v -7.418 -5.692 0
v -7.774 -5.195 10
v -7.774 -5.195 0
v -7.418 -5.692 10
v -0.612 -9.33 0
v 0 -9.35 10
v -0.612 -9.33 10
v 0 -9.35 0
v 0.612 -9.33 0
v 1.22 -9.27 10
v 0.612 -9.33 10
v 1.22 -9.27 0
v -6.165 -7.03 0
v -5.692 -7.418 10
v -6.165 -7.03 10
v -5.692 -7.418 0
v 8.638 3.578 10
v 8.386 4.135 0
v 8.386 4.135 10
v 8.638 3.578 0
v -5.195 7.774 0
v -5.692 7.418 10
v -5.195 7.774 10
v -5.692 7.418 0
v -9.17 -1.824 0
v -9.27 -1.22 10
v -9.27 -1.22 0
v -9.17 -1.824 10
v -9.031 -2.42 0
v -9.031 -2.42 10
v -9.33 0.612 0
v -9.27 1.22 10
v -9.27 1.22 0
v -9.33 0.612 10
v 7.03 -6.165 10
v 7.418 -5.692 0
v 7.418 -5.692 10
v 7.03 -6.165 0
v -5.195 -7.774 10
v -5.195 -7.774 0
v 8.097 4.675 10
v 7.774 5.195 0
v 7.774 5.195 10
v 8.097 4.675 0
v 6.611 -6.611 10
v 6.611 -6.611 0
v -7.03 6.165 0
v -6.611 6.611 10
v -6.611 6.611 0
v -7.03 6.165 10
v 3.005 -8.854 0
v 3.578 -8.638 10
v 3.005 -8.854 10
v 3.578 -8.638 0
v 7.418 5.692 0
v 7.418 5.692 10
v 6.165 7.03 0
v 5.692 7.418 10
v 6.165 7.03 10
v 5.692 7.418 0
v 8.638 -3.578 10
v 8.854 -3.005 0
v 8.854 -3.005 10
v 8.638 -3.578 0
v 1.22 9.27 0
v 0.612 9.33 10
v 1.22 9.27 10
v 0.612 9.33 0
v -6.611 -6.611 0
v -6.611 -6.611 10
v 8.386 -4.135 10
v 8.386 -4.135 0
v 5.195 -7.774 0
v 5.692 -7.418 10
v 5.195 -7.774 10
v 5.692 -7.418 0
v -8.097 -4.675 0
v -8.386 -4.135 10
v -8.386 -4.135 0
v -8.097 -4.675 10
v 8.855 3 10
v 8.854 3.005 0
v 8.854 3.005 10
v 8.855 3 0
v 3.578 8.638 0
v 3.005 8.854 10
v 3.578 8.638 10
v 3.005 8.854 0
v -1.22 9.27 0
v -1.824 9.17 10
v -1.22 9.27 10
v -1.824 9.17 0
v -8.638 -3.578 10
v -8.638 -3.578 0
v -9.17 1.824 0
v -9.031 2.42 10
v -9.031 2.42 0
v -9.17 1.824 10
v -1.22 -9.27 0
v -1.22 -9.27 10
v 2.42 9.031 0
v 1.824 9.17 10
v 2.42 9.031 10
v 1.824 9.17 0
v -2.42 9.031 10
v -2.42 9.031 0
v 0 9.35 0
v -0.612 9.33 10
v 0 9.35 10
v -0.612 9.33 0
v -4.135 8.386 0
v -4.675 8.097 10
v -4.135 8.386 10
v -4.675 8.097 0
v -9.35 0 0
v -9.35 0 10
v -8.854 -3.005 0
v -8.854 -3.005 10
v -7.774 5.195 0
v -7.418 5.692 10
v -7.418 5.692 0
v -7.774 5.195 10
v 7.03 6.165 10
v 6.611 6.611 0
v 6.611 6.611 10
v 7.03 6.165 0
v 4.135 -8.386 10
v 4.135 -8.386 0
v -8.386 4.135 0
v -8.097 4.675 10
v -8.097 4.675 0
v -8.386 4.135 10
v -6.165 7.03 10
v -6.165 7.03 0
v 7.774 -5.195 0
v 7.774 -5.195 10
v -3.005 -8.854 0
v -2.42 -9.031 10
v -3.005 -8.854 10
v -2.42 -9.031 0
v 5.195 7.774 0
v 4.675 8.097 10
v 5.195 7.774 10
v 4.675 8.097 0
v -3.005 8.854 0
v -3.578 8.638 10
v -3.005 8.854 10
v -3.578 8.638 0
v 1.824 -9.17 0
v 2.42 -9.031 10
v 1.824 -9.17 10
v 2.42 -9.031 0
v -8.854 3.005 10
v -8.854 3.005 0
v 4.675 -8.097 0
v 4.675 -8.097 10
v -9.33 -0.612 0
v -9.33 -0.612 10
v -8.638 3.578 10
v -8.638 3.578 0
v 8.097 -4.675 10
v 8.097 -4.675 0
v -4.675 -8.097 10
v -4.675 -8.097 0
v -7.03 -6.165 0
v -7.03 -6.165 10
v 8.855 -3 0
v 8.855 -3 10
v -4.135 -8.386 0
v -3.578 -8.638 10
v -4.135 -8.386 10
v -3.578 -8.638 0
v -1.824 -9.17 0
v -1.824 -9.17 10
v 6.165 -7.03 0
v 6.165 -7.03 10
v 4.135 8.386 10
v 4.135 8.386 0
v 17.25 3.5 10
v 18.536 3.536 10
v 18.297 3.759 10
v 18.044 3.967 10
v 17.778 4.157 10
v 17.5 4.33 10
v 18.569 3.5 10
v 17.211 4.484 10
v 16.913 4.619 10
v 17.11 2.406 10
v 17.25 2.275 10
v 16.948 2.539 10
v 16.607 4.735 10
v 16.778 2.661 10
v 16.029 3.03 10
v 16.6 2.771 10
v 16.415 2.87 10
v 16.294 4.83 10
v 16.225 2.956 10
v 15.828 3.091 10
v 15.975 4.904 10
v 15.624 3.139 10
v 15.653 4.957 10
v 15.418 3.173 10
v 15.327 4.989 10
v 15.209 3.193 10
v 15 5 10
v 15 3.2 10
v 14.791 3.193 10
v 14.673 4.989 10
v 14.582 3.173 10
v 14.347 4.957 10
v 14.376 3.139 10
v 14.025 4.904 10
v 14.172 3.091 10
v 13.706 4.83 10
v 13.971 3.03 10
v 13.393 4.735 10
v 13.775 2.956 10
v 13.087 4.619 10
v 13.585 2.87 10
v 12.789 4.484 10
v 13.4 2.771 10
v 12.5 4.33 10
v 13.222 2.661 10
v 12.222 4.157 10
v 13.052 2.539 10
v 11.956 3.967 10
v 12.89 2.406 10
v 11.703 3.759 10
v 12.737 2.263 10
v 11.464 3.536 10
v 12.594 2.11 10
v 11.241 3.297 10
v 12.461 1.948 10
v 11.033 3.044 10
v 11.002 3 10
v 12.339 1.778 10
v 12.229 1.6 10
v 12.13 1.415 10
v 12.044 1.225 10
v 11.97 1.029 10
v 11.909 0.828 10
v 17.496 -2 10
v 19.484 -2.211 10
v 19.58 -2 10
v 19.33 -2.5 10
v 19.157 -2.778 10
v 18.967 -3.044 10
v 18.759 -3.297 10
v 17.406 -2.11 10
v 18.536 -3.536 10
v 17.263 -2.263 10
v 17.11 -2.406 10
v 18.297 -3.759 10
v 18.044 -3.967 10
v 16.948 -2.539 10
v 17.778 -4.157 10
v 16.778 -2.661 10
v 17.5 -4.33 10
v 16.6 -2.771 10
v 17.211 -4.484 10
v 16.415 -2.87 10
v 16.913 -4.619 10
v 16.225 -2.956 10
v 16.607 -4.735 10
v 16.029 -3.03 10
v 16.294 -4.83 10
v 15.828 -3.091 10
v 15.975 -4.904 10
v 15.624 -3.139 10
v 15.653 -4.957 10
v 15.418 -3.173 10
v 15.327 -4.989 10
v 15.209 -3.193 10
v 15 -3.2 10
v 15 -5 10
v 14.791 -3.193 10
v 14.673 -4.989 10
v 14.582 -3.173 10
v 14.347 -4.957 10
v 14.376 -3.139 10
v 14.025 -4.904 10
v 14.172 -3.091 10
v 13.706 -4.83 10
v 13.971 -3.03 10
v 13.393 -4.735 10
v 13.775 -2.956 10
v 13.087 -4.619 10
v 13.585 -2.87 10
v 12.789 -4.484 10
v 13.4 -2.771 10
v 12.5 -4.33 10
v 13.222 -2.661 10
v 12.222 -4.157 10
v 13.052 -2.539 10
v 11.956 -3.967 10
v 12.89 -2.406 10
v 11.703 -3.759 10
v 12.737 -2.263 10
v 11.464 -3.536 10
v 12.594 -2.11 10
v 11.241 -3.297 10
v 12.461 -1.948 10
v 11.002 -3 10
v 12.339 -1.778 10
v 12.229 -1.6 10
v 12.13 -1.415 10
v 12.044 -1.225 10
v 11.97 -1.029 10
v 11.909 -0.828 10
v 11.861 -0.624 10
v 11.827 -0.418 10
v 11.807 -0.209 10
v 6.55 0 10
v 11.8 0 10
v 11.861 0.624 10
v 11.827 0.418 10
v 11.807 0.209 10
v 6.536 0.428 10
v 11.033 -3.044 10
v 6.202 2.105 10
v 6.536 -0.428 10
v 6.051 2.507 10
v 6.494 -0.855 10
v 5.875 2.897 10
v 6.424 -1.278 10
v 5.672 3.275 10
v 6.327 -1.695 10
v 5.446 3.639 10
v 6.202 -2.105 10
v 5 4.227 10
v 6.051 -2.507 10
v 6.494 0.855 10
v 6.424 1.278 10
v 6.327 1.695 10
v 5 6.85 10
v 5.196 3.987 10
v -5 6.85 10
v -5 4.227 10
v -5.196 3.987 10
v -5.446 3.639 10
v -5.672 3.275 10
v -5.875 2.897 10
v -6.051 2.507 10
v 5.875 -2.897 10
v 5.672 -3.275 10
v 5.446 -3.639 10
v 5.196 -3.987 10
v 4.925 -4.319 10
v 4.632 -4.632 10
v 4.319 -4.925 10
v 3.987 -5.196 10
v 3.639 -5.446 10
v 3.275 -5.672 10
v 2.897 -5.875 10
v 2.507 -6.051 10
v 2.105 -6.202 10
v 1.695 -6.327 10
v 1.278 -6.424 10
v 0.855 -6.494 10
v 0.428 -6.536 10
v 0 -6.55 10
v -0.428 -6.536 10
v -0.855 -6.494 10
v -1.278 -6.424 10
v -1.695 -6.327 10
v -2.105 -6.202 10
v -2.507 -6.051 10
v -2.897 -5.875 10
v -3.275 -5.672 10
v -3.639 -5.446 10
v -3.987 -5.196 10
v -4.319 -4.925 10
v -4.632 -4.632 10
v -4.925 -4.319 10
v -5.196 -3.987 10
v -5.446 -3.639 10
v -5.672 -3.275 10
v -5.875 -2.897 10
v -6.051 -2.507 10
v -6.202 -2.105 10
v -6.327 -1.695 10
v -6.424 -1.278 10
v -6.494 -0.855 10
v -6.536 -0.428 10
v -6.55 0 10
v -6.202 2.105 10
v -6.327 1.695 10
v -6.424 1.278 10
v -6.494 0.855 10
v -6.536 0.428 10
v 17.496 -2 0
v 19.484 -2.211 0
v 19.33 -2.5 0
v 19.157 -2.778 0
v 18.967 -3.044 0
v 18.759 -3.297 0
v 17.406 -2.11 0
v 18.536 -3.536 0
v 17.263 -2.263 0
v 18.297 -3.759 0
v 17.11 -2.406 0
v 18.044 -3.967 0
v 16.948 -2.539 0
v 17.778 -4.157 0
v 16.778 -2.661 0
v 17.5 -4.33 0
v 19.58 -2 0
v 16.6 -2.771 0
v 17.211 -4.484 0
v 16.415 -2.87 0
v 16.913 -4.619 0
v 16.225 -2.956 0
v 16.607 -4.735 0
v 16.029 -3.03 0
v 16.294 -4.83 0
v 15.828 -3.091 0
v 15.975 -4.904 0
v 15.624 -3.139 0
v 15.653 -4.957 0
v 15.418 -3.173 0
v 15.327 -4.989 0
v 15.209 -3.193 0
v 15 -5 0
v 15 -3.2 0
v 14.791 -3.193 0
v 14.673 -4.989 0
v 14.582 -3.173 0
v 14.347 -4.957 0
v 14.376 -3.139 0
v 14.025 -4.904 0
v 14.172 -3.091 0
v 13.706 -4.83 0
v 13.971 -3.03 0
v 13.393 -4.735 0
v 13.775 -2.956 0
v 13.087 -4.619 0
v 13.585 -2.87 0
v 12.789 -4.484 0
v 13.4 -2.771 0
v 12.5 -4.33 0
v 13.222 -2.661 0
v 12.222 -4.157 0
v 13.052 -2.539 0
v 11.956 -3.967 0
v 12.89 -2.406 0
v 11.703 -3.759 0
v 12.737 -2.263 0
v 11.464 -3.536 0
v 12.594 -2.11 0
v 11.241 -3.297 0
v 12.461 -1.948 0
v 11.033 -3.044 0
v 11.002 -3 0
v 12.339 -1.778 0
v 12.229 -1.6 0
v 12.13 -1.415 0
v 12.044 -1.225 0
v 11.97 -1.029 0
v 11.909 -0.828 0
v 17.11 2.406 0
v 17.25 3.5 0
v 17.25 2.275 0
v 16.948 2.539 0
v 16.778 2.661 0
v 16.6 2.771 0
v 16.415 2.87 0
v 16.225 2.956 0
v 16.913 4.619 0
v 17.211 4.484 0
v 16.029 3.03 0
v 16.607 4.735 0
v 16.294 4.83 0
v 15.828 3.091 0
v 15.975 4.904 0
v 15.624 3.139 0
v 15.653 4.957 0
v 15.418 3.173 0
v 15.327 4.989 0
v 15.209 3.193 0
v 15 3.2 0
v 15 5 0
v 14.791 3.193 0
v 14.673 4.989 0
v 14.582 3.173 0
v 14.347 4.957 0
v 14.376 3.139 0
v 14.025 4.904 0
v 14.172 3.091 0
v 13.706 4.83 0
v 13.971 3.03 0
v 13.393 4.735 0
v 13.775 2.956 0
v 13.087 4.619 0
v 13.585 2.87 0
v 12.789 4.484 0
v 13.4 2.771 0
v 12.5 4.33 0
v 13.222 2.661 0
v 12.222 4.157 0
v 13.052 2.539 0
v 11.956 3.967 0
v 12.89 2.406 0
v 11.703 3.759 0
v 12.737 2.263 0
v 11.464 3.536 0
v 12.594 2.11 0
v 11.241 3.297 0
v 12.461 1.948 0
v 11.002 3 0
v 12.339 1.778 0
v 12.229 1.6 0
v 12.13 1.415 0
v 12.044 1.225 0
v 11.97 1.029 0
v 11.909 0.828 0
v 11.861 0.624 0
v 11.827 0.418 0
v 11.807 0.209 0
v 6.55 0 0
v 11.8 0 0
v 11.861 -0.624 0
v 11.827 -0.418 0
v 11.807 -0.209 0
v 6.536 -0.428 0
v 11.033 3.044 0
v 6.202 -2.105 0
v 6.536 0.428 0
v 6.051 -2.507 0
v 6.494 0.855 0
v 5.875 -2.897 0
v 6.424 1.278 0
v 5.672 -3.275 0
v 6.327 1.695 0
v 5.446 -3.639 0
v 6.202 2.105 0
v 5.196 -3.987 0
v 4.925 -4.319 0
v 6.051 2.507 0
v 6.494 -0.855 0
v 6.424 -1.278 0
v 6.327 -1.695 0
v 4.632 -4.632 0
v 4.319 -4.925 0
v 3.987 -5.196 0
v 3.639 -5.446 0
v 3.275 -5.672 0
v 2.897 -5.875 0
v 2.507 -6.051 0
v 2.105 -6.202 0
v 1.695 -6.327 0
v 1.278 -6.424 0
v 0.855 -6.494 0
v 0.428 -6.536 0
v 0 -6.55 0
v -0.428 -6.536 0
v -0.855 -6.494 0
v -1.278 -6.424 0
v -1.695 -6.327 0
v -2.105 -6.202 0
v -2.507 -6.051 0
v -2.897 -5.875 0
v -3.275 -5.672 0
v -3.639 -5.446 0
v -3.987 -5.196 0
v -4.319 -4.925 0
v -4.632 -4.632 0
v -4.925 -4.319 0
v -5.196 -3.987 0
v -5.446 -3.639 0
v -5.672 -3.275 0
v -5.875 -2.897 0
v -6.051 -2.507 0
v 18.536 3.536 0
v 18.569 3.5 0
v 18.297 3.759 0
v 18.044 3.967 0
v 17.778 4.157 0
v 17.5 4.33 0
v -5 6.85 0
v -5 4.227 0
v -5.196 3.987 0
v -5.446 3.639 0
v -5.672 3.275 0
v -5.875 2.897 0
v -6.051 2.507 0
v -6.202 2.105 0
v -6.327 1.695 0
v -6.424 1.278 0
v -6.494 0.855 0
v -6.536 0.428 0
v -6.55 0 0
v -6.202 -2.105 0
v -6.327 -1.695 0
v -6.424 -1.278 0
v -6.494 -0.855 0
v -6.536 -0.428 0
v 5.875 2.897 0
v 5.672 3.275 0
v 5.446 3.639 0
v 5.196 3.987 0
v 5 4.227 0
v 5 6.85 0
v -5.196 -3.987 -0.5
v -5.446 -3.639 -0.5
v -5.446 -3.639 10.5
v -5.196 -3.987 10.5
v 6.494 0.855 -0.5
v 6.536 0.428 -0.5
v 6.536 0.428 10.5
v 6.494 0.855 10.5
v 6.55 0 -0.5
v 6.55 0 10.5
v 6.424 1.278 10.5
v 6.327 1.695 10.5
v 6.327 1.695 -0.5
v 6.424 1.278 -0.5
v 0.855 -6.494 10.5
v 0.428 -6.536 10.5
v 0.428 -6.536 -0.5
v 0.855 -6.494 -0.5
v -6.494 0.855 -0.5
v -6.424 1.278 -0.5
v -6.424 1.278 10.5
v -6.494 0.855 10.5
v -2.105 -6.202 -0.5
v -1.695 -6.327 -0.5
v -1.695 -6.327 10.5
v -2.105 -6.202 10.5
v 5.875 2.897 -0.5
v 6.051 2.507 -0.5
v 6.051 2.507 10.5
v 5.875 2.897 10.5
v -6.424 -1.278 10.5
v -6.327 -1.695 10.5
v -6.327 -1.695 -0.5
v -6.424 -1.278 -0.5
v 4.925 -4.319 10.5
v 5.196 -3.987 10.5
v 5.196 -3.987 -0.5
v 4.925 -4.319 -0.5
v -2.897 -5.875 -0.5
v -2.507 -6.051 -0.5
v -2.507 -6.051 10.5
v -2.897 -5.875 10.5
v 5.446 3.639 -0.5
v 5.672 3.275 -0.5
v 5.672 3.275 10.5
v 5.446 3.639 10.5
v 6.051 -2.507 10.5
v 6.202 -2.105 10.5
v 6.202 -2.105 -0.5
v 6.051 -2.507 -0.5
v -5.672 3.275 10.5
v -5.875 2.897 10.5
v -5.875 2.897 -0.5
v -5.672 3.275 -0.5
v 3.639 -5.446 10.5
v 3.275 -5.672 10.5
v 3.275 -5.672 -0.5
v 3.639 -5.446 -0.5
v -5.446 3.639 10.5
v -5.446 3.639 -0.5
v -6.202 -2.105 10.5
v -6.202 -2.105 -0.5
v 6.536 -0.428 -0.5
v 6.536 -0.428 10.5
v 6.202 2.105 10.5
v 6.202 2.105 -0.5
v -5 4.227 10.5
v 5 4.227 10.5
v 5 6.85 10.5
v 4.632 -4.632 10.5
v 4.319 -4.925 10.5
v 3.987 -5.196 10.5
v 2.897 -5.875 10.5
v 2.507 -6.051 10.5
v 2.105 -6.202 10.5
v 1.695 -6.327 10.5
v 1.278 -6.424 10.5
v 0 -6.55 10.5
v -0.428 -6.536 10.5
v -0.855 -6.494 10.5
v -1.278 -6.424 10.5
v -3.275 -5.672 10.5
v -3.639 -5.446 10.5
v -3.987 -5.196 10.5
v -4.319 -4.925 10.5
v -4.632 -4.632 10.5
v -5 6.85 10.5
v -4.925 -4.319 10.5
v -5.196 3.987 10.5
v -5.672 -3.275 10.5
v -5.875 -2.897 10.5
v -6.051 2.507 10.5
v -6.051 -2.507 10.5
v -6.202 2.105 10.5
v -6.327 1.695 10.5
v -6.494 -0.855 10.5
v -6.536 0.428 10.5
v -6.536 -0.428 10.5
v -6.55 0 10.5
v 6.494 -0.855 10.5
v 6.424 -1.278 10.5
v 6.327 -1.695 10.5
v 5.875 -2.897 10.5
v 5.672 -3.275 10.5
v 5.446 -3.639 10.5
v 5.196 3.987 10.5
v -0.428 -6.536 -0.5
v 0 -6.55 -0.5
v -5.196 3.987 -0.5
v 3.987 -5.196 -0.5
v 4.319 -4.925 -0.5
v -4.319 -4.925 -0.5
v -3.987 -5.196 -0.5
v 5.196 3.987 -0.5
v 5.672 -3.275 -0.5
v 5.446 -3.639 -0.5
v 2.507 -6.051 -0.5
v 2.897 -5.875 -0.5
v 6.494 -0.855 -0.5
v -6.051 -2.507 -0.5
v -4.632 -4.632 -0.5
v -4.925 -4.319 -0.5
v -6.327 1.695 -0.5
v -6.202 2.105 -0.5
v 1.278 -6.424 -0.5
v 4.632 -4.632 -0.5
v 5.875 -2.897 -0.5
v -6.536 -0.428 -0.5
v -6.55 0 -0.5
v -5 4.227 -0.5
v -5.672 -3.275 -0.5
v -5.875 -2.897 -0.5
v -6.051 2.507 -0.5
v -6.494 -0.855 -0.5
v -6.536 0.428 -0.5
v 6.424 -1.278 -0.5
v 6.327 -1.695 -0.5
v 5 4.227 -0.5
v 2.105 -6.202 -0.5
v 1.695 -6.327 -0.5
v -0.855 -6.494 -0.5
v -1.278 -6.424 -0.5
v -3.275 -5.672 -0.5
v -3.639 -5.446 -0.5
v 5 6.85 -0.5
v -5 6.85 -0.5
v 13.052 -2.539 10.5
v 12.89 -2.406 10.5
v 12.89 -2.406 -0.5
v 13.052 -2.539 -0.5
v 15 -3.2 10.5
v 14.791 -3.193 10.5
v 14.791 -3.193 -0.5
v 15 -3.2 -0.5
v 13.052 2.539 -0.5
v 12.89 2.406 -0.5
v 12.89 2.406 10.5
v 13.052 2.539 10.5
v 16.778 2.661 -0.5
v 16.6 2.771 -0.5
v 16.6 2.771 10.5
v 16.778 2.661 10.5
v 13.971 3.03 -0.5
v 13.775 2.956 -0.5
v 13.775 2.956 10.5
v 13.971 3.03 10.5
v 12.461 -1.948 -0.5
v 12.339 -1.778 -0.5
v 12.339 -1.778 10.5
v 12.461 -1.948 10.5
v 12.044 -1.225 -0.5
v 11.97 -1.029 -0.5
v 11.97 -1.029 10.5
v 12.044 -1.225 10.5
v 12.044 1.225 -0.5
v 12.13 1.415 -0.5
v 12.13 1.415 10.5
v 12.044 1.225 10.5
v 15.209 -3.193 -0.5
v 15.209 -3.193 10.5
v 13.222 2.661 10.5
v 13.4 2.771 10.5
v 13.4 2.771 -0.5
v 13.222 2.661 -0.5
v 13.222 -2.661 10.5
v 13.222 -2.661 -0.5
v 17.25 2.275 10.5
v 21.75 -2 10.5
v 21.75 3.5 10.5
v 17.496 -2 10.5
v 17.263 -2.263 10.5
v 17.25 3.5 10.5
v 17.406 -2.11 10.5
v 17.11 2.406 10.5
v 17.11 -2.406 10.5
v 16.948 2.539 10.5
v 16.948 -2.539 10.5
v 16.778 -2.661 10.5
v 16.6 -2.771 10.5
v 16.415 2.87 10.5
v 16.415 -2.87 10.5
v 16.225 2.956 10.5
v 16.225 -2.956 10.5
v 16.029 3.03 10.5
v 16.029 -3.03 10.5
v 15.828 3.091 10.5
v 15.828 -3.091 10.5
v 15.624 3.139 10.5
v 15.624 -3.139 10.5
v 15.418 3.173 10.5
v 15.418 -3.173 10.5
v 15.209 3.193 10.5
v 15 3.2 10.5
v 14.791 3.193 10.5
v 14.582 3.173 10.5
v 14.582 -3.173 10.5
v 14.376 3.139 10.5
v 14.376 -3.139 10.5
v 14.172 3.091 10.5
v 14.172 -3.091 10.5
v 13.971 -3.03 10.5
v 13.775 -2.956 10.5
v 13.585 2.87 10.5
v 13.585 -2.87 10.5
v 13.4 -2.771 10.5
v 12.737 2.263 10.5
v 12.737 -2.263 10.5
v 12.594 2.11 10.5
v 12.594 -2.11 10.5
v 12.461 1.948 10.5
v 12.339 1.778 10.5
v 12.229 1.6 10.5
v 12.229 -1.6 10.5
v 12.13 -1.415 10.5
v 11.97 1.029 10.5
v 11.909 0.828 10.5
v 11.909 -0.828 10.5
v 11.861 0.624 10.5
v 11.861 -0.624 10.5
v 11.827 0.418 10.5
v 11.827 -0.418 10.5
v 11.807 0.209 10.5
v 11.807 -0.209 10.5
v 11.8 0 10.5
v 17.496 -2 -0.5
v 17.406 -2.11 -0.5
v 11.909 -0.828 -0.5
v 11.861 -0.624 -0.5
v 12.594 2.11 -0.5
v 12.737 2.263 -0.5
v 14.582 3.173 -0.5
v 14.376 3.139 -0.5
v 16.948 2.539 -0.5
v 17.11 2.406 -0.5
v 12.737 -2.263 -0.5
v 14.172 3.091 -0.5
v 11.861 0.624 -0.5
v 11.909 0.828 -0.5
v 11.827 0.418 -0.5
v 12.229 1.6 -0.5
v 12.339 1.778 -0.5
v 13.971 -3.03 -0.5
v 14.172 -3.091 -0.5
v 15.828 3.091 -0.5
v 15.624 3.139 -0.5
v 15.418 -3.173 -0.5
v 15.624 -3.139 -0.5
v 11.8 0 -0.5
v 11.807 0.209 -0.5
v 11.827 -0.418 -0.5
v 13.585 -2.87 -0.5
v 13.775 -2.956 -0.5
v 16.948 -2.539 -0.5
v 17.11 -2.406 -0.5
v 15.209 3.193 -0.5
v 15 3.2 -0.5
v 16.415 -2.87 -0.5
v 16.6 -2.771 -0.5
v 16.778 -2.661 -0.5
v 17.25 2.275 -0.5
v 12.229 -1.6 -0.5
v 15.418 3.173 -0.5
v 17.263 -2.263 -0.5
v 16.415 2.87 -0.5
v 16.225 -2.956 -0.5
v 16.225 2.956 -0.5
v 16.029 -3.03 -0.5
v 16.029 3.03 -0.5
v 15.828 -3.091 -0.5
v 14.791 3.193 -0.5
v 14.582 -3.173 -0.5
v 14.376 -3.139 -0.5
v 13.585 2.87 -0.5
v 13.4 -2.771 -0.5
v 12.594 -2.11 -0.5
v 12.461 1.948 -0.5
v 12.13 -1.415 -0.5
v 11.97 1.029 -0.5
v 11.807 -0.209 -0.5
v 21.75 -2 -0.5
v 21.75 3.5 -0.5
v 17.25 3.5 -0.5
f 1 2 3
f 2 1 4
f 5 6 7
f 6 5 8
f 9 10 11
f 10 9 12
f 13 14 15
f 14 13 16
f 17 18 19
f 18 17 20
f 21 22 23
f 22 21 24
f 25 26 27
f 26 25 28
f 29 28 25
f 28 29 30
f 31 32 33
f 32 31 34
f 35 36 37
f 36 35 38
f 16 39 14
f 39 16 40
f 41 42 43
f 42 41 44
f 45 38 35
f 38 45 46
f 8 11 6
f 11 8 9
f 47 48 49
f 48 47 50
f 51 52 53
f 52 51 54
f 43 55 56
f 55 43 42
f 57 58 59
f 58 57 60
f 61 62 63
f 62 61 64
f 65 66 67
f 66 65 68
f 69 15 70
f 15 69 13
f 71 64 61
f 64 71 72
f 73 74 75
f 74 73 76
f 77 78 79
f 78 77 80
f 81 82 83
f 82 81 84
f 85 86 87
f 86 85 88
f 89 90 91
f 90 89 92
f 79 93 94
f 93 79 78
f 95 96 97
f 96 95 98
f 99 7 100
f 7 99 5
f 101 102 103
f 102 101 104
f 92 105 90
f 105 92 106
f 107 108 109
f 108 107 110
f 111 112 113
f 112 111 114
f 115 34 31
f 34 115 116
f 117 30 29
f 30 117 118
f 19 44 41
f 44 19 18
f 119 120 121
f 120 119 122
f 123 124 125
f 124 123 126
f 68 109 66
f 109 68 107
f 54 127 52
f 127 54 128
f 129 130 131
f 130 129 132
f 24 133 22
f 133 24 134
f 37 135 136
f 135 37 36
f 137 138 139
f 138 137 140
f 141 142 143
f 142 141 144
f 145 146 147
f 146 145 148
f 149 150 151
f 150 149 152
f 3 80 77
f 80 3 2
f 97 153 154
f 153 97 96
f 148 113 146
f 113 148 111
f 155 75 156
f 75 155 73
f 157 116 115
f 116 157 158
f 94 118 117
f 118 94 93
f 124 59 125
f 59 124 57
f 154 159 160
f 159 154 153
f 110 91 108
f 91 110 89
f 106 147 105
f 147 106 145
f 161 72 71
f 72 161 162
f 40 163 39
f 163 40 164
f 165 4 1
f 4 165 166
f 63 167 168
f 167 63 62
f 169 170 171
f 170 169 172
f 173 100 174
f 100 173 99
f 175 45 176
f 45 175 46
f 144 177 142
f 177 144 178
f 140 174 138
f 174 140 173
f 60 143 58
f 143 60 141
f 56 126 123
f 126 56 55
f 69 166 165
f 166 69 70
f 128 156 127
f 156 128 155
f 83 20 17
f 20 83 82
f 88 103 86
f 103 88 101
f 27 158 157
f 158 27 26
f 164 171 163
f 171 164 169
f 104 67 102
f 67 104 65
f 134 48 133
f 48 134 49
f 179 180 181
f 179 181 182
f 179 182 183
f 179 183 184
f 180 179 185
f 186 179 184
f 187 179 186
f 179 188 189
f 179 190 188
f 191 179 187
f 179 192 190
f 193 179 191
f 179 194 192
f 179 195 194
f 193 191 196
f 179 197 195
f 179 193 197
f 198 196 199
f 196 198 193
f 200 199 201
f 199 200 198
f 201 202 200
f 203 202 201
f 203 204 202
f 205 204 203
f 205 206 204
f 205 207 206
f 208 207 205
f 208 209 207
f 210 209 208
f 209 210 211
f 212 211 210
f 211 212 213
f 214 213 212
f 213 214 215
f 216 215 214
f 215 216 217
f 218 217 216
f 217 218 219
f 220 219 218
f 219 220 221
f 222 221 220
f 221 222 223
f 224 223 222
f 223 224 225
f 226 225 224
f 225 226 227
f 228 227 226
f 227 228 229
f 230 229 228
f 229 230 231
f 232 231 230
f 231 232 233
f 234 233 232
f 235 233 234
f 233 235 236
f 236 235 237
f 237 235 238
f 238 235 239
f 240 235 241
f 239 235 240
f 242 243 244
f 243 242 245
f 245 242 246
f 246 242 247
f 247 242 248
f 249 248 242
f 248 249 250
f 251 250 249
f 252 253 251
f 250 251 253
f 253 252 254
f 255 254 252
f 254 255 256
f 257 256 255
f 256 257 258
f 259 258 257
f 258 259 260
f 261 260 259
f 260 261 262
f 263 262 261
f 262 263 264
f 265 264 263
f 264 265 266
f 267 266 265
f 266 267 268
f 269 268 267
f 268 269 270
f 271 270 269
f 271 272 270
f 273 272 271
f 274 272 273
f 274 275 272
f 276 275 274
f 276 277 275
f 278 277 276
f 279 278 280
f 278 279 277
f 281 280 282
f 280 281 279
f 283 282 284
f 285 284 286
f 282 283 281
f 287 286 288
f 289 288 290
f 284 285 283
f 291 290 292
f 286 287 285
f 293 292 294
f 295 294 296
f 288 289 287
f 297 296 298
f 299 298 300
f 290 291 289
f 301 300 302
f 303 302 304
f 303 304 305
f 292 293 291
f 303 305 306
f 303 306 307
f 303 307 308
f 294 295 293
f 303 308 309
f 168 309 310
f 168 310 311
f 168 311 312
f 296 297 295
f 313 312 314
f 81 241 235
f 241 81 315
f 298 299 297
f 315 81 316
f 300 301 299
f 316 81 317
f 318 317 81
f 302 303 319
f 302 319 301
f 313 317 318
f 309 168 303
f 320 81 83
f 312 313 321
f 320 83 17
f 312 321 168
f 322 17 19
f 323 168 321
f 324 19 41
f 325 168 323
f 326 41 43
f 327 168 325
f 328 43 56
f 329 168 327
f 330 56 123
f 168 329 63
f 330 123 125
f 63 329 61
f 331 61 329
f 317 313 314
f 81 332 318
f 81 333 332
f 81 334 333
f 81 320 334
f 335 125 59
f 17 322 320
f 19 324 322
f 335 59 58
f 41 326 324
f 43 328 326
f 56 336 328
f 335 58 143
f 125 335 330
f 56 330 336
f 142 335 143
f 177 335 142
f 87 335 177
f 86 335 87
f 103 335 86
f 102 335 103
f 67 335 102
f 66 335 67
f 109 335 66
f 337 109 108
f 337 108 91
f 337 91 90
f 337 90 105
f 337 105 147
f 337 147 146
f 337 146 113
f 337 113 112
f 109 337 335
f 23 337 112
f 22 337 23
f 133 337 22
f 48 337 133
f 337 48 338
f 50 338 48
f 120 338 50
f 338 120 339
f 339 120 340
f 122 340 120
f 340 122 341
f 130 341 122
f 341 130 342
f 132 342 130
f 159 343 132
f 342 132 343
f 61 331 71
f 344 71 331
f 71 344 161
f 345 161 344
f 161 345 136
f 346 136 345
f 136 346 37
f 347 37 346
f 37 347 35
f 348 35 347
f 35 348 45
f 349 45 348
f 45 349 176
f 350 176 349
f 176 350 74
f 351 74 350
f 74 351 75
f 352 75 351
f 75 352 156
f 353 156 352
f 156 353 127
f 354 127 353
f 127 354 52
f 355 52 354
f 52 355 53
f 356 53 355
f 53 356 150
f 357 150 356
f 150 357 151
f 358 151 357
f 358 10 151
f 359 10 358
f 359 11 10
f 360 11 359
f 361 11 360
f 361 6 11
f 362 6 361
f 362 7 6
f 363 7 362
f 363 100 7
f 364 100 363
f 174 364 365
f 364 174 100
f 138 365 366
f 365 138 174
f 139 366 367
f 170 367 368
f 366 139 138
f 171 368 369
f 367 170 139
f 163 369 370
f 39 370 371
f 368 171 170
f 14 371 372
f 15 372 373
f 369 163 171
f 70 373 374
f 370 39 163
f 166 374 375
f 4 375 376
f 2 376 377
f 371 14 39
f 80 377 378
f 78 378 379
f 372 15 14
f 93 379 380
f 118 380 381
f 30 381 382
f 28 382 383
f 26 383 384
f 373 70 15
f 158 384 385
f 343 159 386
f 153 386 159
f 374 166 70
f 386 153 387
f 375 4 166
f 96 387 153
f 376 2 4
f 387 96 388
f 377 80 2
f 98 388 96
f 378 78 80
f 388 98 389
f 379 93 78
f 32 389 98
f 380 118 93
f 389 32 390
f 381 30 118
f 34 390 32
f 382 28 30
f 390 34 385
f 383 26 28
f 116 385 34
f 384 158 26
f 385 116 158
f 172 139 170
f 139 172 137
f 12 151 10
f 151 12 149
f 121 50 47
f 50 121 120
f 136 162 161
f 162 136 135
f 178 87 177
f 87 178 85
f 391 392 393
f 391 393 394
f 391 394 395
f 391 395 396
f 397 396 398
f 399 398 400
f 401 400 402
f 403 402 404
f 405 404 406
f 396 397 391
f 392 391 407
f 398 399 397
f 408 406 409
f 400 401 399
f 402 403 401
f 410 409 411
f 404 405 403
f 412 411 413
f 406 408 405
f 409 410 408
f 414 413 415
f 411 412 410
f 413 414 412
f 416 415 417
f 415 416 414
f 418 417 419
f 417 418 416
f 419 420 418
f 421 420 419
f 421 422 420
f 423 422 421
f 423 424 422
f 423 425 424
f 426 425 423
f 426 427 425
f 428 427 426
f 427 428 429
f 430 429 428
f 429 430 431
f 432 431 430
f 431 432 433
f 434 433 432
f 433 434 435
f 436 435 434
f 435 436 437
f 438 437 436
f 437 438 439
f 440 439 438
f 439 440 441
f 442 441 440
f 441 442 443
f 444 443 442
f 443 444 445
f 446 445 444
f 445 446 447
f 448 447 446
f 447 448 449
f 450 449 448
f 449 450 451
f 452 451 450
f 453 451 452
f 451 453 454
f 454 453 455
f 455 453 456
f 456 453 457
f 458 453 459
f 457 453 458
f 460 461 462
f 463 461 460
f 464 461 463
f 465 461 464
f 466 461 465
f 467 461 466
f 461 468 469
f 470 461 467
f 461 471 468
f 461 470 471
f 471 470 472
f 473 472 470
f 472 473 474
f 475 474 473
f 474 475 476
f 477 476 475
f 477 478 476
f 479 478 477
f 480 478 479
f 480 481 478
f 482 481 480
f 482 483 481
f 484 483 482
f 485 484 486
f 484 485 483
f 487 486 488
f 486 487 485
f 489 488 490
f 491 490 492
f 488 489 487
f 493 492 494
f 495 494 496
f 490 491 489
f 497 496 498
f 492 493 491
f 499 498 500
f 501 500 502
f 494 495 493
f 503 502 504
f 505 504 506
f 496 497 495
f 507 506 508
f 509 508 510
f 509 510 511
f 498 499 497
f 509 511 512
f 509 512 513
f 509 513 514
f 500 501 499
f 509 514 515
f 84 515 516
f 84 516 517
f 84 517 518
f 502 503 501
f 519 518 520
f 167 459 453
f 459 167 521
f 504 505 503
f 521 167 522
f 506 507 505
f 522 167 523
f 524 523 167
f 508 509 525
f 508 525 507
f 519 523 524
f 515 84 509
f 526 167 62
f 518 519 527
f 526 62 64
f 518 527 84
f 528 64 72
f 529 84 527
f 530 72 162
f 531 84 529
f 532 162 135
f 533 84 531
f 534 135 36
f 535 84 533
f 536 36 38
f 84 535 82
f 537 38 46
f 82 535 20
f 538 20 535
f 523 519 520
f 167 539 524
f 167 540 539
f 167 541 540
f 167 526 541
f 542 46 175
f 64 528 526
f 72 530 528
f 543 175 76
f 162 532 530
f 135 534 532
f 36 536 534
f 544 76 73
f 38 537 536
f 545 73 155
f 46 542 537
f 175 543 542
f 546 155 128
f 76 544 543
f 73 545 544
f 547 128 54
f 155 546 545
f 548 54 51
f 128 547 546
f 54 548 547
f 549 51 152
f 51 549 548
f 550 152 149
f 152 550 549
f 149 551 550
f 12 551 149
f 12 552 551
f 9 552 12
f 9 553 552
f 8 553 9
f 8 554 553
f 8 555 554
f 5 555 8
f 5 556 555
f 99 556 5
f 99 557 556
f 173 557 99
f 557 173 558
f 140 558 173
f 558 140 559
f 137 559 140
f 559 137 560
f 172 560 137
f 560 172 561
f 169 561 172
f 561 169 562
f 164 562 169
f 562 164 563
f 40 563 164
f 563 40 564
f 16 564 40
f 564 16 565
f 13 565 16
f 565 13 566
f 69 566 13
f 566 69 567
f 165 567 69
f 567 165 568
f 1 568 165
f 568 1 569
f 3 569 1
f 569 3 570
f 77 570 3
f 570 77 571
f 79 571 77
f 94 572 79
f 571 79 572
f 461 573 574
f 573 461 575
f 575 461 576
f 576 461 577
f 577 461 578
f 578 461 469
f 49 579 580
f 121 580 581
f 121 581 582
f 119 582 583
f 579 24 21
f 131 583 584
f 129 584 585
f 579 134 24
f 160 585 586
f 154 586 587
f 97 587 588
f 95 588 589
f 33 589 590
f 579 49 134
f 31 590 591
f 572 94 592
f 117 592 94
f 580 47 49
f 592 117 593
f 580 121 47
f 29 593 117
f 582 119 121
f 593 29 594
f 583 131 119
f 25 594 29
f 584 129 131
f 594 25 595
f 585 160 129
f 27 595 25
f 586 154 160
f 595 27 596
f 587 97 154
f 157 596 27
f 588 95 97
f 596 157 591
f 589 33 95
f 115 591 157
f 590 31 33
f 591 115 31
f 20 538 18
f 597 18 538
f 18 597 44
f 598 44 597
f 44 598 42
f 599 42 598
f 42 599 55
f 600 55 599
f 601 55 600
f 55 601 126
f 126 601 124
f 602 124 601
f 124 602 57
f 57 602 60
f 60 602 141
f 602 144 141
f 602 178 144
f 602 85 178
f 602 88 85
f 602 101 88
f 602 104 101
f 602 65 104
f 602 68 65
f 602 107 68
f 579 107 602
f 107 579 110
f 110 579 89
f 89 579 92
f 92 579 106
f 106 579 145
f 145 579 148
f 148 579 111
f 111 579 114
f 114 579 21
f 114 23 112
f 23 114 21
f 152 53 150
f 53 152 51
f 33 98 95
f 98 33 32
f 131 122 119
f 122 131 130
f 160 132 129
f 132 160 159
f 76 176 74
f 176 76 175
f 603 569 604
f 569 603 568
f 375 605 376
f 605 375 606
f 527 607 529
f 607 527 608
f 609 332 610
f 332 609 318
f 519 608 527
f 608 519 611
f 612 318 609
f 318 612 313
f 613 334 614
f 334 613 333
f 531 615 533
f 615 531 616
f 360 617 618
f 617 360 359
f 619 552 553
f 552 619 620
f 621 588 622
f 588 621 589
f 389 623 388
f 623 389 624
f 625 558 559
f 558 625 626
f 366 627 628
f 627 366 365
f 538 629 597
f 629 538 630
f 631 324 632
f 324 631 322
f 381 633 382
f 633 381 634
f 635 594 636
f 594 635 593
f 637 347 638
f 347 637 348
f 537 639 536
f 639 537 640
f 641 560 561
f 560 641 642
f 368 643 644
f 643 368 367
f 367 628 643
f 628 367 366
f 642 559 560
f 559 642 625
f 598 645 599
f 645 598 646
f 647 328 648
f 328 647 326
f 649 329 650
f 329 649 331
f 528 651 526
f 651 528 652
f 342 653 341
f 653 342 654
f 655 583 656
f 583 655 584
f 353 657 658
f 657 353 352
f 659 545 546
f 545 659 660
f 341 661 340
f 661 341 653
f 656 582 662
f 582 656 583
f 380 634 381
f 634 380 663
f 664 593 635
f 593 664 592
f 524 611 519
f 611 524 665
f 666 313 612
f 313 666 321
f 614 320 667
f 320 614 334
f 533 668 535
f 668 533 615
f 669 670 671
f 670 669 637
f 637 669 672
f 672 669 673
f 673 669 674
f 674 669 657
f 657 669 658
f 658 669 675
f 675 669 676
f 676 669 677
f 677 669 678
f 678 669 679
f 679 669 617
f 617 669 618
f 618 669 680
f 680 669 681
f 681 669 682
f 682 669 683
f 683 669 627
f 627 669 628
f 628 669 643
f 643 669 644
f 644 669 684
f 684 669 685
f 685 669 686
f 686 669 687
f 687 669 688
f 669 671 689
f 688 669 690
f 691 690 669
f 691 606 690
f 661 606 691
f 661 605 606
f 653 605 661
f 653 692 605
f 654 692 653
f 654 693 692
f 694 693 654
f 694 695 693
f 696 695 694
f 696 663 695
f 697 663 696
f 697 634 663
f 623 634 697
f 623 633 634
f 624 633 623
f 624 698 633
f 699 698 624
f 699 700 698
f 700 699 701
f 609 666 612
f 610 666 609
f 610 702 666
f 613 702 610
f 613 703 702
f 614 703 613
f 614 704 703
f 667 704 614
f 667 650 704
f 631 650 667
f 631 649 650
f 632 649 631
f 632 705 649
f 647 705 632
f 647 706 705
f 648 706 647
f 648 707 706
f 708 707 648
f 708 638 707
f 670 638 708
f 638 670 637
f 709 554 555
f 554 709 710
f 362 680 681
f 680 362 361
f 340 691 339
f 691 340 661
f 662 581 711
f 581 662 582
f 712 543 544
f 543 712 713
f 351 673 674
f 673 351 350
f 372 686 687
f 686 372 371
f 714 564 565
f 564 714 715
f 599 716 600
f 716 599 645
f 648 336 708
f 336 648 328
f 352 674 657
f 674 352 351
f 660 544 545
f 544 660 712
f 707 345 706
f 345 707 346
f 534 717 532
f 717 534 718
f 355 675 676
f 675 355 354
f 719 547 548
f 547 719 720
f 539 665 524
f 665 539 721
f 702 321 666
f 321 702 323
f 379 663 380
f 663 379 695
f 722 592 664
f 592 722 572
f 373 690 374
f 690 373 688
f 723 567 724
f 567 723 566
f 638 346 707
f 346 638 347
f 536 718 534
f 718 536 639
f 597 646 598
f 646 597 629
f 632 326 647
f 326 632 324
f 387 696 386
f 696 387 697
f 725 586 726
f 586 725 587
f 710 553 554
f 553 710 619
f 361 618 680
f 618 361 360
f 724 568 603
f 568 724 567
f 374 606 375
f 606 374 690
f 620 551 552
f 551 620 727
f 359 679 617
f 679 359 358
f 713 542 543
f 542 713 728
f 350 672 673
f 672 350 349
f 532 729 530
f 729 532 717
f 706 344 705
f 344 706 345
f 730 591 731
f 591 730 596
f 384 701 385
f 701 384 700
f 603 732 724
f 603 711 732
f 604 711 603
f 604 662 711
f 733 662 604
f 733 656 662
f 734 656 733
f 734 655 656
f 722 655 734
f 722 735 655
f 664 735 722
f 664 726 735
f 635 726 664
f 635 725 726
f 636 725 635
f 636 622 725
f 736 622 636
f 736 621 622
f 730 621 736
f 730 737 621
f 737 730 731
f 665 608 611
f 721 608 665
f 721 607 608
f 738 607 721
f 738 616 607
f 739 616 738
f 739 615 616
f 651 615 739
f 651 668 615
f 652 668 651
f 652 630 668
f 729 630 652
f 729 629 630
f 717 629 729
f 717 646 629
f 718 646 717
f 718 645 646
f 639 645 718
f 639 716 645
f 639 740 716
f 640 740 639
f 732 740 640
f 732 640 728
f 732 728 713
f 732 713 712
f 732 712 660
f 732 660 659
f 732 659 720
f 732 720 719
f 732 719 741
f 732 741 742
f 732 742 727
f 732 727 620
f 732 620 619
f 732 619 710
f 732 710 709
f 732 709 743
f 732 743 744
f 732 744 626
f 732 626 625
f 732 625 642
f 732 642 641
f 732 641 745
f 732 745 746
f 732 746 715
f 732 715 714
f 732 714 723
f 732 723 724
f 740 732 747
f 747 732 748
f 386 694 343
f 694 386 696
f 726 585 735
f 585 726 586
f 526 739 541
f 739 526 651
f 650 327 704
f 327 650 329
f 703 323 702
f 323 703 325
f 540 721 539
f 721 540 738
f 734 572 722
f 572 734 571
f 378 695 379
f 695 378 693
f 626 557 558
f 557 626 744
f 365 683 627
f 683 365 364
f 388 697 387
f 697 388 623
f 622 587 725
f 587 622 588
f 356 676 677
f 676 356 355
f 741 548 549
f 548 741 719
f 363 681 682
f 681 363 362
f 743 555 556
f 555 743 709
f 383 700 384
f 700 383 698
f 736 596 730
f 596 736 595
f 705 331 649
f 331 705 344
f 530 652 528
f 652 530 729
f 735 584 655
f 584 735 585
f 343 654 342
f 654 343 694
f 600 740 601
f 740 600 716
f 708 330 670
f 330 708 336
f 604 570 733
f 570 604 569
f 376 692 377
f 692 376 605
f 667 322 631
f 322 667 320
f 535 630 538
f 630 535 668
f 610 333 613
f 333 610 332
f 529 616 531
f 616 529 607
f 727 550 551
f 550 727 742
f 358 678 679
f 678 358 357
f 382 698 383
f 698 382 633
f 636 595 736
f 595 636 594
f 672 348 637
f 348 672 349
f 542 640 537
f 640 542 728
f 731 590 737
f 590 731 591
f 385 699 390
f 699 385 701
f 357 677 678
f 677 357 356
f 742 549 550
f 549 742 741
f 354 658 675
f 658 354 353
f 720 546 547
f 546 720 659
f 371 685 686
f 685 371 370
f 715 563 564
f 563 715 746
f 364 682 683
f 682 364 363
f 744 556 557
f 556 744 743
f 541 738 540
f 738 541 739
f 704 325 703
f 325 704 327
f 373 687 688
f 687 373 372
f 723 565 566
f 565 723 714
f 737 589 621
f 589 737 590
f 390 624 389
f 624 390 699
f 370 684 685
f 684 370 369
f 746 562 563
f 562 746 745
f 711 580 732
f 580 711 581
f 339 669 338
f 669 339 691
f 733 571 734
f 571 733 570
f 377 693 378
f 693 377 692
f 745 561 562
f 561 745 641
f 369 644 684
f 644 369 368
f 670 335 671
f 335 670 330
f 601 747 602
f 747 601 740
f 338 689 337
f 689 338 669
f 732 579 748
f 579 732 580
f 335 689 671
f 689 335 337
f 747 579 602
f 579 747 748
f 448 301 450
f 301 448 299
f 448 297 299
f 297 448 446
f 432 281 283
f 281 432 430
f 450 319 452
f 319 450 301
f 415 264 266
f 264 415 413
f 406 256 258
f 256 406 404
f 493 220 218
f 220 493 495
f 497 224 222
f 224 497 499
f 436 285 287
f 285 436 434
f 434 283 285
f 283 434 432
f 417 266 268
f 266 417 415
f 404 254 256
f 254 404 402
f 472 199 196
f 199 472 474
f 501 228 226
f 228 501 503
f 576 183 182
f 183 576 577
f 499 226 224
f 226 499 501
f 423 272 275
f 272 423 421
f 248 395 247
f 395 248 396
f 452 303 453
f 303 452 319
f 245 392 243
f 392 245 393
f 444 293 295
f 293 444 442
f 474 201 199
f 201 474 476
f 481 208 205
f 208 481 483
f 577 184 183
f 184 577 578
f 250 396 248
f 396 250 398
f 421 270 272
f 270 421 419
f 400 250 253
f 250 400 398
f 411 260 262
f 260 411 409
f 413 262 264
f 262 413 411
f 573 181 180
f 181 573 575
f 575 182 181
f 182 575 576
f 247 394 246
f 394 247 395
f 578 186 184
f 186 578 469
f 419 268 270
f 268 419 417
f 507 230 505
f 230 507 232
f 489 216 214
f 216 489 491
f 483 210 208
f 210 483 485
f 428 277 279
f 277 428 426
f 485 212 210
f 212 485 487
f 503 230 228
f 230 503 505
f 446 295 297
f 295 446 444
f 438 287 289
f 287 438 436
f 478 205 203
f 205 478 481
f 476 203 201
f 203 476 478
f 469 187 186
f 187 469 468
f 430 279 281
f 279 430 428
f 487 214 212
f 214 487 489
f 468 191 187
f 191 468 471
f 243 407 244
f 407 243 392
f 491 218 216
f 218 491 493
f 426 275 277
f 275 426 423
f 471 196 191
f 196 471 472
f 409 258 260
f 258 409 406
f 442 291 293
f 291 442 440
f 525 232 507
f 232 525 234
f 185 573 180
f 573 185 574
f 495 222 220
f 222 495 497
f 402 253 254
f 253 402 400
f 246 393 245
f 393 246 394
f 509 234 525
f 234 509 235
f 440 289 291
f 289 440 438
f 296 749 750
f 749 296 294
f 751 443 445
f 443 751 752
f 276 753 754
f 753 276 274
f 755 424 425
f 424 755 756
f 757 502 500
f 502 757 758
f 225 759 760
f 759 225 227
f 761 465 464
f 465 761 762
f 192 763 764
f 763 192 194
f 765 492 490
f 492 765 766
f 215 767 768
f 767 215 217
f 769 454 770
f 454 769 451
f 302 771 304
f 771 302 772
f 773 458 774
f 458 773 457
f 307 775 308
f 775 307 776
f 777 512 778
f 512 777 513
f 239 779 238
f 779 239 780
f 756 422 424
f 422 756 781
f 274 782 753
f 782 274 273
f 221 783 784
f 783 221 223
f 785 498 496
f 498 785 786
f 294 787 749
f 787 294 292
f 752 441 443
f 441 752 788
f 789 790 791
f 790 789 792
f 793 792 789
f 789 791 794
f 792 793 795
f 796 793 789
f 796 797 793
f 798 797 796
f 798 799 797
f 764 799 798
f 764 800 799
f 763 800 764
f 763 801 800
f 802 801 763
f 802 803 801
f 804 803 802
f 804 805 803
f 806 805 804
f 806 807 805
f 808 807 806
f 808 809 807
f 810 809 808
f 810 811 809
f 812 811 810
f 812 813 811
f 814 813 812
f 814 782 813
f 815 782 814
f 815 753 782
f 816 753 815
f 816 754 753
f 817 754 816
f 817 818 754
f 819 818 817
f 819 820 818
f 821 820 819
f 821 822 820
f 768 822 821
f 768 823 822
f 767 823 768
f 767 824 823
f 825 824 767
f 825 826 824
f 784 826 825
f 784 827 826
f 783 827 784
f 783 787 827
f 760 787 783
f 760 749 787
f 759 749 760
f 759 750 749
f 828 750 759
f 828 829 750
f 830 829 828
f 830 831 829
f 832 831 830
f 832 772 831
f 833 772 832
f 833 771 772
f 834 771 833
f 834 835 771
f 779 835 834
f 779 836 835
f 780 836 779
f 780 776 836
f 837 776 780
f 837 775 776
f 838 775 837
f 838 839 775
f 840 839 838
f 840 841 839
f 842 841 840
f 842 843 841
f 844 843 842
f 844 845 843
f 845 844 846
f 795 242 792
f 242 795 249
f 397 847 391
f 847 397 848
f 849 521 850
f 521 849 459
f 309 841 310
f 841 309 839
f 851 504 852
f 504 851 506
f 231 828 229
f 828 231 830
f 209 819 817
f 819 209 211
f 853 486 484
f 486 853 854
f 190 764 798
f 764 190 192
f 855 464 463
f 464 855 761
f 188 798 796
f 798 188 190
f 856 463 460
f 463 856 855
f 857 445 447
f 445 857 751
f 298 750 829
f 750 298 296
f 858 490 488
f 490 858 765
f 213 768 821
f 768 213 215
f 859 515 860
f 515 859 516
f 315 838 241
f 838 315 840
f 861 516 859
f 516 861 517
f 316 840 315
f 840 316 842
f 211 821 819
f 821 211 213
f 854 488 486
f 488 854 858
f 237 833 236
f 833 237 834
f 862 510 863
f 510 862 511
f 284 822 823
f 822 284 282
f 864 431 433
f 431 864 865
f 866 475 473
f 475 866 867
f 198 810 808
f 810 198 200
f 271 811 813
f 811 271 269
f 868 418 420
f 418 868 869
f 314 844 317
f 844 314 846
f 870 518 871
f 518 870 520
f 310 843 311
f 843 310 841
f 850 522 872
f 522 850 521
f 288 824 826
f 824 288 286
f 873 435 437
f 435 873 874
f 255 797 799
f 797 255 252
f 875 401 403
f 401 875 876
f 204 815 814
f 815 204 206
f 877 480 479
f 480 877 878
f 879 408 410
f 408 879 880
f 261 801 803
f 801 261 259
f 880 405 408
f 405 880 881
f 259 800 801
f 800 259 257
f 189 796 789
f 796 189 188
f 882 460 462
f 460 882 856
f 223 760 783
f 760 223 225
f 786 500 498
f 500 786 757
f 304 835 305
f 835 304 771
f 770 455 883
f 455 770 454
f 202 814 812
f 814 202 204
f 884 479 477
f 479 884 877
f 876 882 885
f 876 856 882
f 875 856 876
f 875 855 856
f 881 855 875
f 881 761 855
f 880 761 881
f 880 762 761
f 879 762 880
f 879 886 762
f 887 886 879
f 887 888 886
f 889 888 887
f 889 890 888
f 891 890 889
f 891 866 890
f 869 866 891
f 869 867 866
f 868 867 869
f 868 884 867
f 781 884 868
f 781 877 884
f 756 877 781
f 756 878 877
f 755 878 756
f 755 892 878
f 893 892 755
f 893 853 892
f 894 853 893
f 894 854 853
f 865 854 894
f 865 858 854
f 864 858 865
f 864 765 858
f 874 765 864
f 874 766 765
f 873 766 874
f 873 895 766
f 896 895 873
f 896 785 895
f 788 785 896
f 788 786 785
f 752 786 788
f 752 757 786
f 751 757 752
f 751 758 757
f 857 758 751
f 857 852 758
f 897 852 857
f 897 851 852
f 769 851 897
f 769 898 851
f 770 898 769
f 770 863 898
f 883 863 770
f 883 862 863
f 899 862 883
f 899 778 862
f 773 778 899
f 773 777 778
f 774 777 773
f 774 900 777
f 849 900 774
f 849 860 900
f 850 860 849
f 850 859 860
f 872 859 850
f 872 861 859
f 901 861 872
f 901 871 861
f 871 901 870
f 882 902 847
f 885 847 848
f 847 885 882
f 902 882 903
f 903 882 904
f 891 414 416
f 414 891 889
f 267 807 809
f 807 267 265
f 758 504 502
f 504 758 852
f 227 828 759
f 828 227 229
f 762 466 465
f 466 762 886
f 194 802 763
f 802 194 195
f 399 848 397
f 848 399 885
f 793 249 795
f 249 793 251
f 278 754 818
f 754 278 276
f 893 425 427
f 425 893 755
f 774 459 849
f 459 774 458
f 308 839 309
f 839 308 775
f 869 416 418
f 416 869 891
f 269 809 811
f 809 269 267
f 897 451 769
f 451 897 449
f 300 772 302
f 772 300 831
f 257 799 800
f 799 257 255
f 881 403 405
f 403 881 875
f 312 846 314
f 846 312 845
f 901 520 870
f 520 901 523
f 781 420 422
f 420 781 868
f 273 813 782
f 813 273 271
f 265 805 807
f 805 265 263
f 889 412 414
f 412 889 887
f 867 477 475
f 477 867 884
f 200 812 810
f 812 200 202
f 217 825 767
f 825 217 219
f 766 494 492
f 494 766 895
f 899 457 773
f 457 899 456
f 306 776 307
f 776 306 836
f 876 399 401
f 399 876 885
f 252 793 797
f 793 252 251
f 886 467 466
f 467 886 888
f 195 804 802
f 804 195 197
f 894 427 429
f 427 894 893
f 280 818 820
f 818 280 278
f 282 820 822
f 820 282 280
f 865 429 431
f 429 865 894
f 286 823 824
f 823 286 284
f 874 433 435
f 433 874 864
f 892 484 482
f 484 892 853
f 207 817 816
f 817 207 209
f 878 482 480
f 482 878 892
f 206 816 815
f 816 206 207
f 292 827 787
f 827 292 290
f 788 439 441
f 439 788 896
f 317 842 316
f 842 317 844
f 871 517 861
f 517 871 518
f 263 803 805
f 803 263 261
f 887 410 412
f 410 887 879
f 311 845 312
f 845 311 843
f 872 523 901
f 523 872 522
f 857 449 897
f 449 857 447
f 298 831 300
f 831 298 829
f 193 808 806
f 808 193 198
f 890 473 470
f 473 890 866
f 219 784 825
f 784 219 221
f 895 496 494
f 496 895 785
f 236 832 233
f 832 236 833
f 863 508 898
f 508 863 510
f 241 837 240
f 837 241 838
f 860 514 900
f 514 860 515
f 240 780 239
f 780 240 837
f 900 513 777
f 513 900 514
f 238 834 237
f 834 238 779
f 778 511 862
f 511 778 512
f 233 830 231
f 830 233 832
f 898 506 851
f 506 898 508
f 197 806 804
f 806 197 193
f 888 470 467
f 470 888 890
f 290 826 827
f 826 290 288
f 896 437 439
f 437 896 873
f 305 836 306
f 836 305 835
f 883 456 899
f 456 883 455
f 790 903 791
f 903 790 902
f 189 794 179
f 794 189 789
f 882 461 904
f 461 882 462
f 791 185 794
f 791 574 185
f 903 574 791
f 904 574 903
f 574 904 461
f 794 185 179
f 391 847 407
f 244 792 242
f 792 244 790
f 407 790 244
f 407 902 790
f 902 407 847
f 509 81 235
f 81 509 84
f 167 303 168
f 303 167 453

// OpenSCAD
// Tubing clip for 12.7 mm stand rod
// Print orientation: flat on bed, extrusion along +Z

$fn = 96;

// ---- Ring dimensions ----
rod_id     = 12.7;   // stand rod inner diameter
rod_wall   = 3;      // rod ring wall thickness
rod_od     = rod_id + 2 * rod_wall; // 18.7 mm outer diameter
rod_open   = 10;     // opening width on -X side

tube_id    = 6;      // tubing inner diameter
tube_wall  = 2;      // tubing ring wall thickness
tube_od    = tube_id + 2 * tube_wall; // 10 mm outer diameter
tube_open  = 4.5;    // opening width on +X side

// ---- Bridge ----
bridge_w   = 6;      // bridge width along Y
bridge_x0  = 8;      // bridge start (X)
bridge_x1  = 12;     // bridge end (X)

// ---- Misc ----
eps        = 0.5;    // cutter overshoot past faces

difference() {
    union() {
        // Rod ring
        cylinder(d = rod_od, h = 10, $fn = 96);
        translate([0, 0, -eps])
            cylinder(d = rod_id + 0.4, h = 10 + 2 * eps, $fn = 96); // small clearance bore
        // Opening on -X side
        translate([-rod_open / 2, -rod_wall, -eps])
            cube([rod_open, rod_od / 2 + eps, 10 + 2 * eps]);

        // Tubing ring
        translate([15, 0, 0])
            cylinder(d = tube_od, h = 10, $fn = 96);
        translate([15, 0, -eps])
            cylinder(d = tube_id + 0.4, h = 10 + 2 * eps, $fn = 96); // small clearance bore
        // Opening on +X side
        translate([15 + tube_open / 2, -tube_wall, -eps])
            cube([tube_open, tube_od / 2 + eps, 10 + 2 * eps]);

        // Solid bridge between the rings
        translate([bridge_x0, -bridge_w / 2, 0])
            cube([bridge_x1 - bridge_x0, bridge_w, 10]);
    }
}
